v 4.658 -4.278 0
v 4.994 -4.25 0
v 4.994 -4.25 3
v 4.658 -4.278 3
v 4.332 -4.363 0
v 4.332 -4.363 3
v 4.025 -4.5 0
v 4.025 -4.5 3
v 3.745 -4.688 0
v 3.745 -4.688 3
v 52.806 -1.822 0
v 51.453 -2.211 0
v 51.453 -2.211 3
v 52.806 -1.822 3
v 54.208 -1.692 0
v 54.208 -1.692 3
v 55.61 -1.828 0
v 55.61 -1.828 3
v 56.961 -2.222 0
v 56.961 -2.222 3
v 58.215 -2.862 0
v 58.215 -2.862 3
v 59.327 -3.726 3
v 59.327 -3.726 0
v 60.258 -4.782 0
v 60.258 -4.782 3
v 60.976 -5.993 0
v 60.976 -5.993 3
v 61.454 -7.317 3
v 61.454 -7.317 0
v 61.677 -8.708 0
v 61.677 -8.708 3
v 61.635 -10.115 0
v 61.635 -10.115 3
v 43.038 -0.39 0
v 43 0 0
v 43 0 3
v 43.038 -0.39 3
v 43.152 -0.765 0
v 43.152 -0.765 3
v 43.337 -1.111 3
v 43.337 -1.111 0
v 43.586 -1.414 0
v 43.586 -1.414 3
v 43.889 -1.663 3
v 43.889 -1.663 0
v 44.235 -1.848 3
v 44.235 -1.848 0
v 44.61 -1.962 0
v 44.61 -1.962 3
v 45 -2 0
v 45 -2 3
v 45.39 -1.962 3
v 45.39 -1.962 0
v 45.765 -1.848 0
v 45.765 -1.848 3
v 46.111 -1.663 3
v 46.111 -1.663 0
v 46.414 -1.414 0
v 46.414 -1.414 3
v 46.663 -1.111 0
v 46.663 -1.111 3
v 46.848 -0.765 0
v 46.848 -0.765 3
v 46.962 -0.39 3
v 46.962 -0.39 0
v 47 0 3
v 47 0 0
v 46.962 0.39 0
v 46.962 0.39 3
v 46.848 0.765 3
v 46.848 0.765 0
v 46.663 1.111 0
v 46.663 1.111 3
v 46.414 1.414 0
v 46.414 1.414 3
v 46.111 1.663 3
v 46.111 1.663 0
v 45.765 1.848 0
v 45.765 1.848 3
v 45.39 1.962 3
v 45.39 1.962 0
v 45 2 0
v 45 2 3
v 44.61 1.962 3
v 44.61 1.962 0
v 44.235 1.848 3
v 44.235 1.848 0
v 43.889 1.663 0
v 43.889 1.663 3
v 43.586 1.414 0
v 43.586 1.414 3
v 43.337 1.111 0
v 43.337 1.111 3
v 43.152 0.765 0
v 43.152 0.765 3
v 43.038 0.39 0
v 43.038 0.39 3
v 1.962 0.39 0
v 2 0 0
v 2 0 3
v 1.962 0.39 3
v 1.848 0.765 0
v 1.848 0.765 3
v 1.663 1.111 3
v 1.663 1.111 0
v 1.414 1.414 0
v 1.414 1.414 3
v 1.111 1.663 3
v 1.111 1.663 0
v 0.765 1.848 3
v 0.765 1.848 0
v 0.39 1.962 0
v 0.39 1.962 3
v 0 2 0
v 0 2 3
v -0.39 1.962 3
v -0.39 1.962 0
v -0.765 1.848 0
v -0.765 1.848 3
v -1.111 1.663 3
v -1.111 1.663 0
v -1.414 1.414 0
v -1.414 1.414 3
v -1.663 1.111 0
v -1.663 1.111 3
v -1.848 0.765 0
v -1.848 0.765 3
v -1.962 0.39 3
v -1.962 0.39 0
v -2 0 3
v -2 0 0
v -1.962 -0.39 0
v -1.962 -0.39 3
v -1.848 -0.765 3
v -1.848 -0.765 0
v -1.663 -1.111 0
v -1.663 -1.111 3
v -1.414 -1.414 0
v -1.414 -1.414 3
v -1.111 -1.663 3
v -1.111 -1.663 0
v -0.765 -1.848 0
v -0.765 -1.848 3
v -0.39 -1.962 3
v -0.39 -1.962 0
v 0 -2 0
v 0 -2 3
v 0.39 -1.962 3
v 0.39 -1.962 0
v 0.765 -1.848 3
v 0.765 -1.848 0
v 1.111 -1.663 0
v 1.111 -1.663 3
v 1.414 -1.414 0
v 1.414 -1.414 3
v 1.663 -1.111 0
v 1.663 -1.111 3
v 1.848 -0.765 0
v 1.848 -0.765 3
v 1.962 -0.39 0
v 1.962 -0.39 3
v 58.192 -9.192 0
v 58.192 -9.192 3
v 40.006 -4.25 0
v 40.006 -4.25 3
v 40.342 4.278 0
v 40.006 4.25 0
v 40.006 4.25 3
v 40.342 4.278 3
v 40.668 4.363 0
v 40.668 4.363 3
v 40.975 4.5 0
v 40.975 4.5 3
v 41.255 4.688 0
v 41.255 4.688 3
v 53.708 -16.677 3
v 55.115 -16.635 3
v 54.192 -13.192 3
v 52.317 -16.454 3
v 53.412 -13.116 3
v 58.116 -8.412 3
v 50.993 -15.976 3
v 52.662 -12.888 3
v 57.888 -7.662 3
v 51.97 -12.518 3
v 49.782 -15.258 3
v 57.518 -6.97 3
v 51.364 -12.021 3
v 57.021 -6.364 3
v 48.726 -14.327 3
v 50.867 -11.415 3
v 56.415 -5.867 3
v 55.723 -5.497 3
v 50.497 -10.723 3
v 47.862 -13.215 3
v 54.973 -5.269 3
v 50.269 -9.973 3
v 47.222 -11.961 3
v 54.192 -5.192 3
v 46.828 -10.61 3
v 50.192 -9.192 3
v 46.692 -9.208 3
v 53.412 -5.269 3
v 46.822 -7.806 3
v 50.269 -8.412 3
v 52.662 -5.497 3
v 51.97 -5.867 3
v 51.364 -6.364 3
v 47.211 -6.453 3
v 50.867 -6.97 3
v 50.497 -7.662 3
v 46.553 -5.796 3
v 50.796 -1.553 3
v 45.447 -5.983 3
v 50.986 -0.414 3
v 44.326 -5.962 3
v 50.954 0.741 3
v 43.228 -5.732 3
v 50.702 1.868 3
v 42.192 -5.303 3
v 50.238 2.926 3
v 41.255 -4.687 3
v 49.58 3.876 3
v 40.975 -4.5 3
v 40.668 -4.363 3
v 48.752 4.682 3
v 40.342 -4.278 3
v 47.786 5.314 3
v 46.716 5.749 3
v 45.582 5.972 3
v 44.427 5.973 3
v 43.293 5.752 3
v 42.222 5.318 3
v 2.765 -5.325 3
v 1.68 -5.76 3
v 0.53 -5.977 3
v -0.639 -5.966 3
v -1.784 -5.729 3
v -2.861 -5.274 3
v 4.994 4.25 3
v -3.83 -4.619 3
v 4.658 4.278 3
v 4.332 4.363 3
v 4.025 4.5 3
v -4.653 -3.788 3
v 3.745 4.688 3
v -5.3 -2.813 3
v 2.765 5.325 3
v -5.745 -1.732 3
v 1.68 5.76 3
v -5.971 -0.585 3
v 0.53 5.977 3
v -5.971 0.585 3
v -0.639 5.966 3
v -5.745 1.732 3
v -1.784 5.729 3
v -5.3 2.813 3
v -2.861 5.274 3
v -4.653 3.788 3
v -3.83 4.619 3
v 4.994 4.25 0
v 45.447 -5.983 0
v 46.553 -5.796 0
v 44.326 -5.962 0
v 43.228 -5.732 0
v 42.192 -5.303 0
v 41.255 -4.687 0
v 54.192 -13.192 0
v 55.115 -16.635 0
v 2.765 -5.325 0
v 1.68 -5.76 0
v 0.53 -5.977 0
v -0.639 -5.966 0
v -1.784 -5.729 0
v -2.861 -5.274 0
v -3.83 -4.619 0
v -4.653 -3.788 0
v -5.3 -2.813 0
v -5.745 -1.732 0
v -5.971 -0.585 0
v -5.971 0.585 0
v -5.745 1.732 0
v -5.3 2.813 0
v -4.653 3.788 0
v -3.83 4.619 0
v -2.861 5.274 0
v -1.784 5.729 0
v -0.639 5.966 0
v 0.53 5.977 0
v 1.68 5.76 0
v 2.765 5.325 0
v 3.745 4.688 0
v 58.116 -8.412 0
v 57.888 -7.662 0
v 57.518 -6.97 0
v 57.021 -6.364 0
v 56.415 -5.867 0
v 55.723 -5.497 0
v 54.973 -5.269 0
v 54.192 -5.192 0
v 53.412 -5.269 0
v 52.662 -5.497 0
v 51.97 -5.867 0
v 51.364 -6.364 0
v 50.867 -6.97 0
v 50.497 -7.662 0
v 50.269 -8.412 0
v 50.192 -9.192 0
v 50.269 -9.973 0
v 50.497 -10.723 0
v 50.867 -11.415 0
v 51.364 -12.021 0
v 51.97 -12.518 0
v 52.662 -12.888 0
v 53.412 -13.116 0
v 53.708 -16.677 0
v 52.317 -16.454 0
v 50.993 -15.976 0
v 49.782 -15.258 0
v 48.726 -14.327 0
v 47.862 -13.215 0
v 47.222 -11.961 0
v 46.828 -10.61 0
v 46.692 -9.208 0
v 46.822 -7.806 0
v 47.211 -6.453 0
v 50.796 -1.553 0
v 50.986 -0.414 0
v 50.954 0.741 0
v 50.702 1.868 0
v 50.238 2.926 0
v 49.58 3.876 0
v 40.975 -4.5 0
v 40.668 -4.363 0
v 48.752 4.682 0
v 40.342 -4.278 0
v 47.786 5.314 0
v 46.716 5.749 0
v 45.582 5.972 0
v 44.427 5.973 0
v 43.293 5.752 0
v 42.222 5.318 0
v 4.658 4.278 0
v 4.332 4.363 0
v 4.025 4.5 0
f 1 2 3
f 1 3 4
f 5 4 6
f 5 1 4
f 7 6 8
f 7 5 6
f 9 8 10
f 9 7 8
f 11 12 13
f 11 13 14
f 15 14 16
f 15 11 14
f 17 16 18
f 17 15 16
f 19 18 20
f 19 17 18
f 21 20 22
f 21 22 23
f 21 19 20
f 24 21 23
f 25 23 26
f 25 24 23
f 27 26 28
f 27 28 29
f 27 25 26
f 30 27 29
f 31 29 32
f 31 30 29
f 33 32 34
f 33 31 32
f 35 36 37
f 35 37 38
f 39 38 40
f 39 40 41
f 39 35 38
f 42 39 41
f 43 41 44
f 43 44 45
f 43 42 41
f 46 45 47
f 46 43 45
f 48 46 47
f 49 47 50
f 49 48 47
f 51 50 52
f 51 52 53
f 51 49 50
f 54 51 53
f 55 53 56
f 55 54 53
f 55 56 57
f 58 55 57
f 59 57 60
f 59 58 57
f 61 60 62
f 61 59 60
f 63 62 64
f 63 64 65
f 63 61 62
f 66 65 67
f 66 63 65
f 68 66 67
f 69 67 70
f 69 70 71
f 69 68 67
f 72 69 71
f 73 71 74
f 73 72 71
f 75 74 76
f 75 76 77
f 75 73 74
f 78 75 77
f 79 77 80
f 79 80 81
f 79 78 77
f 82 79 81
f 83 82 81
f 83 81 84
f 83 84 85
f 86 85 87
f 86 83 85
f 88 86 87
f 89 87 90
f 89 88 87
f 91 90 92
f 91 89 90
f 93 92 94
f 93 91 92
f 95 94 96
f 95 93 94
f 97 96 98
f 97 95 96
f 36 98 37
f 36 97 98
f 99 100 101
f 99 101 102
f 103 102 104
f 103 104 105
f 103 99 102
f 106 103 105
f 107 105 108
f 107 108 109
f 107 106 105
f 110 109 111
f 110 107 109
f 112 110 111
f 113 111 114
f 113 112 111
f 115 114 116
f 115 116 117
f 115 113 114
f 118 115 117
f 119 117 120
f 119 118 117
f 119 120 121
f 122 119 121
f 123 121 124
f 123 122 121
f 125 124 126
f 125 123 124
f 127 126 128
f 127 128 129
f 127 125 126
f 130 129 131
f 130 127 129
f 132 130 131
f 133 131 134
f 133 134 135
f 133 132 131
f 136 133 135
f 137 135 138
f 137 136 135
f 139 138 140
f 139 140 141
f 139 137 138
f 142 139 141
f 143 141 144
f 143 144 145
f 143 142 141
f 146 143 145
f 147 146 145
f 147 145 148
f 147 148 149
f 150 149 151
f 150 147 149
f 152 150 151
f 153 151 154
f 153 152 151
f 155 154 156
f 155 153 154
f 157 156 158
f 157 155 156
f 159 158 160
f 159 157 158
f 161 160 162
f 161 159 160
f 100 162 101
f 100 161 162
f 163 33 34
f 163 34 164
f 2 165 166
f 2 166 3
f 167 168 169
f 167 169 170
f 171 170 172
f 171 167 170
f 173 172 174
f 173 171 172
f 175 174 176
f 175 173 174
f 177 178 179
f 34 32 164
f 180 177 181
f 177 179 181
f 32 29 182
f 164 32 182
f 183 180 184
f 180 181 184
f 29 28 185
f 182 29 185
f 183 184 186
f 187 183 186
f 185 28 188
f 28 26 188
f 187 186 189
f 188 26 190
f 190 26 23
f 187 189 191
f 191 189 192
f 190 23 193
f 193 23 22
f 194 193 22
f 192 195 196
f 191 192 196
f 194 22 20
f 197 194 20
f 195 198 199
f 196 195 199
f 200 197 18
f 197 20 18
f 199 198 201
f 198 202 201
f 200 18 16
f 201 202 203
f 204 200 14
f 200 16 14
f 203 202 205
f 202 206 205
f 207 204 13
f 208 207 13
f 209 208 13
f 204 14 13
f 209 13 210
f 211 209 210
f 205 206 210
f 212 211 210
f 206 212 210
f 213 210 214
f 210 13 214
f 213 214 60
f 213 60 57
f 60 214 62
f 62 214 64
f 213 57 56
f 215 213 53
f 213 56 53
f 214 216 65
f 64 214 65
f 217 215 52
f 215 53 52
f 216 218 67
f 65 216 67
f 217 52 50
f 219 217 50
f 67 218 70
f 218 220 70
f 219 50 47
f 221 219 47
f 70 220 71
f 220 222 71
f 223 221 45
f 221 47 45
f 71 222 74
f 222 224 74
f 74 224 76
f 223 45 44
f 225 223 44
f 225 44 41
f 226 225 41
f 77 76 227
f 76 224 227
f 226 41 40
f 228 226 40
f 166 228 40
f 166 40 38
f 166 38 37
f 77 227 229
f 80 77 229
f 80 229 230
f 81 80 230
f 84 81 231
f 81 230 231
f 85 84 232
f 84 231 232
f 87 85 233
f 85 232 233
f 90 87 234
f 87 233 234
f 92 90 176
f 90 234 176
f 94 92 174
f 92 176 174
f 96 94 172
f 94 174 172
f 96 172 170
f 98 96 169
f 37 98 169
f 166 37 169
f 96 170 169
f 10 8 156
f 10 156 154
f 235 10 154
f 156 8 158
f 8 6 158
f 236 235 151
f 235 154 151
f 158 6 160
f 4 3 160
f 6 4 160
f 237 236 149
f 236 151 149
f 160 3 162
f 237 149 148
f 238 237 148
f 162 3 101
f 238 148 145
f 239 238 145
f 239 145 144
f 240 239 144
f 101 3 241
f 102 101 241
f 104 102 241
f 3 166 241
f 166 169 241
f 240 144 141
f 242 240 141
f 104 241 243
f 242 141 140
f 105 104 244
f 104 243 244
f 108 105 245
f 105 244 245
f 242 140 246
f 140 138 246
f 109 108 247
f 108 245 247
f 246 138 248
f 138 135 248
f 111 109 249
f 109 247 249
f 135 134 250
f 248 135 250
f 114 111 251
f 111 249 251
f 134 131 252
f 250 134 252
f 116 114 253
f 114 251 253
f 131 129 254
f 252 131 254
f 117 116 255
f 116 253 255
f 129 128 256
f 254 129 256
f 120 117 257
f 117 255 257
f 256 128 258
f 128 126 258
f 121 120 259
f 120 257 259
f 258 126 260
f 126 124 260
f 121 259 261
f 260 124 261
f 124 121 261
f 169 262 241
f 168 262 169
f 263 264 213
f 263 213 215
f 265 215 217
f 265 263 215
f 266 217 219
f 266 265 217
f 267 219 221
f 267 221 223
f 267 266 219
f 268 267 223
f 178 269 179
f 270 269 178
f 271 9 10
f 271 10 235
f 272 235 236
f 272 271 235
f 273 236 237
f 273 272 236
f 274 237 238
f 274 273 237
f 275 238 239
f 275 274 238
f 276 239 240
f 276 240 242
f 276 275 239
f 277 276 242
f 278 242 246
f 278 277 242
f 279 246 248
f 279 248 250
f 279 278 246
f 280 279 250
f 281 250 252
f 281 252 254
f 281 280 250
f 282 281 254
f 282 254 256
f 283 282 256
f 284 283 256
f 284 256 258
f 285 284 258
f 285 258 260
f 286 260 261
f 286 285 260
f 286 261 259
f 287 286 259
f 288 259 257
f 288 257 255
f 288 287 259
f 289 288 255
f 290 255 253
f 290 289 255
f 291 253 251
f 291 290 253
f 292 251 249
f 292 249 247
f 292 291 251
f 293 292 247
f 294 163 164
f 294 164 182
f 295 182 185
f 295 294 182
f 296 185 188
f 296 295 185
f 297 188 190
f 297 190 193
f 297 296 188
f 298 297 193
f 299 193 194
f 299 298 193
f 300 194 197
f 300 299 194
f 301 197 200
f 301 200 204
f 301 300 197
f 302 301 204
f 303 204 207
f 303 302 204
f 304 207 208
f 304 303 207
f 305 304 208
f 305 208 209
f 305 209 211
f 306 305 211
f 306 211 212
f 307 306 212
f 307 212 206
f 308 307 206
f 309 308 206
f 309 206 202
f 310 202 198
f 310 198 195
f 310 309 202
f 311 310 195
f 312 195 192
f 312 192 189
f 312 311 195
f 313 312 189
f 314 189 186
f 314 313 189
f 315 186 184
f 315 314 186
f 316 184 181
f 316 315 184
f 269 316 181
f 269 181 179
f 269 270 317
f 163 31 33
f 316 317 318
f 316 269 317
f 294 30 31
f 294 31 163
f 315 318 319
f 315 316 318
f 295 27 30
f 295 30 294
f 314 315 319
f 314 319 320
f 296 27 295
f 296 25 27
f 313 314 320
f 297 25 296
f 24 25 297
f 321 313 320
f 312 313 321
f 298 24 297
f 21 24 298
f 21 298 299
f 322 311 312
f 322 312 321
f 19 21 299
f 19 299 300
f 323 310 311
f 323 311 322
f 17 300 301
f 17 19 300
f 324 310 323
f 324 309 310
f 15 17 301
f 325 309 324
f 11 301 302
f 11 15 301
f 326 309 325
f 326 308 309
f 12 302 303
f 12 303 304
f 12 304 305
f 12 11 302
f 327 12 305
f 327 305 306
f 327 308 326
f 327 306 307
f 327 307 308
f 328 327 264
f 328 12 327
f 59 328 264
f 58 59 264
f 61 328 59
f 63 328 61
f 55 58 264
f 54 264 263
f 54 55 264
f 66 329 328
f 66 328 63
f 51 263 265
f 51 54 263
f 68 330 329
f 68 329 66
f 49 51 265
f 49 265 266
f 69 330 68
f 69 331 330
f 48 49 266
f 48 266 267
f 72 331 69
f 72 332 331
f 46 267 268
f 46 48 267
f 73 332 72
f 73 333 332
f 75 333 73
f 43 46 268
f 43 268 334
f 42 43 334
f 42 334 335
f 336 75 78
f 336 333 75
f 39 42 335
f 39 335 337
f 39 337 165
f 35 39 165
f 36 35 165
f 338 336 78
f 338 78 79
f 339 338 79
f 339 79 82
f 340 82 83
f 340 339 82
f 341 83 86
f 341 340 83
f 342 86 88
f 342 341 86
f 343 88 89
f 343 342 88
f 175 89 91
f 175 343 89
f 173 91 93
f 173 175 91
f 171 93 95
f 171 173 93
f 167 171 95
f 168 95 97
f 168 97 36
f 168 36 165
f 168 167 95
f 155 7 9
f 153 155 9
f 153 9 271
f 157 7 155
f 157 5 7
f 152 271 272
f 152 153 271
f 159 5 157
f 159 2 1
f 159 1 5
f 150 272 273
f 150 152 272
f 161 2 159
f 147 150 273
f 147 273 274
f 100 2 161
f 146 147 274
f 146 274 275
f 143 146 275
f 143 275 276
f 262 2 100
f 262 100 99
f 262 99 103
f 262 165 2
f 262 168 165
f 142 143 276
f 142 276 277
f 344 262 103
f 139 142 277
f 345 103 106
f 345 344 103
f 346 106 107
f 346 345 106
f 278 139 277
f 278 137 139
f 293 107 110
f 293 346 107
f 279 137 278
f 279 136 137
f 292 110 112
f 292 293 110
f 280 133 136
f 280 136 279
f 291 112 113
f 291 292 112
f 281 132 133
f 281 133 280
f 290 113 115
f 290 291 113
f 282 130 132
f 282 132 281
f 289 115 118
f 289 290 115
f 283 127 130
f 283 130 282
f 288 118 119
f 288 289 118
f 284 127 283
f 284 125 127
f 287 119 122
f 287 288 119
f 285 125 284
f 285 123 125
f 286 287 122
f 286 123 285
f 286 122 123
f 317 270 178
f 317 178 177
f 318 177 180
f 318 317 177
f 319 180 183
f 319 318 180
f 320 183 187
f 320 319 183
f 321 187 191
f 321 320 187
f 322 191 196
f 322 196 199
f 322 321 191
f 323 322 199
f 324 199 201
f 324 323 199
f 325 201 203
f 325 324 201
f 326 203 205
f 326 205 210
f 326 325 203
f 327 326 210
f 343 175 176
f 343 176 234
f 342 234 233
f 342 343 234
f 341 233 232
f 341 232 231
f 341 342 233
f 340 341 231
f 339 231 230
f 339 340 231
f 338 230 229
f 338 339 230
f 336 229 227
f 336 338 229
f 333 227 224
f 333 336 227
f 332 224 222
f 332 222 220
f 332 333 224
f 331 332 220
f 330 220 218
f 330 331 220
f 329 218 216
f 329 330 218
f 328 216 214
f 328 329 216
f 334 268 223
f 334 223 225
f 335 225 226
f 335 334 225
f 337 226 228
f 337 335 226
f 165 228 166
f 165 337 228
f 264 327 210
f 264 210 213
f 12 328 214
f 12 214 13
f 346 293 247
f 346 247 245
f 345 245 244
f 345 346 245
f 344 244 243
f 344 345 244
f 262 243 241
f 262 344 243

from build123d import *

# Parameters (mm, degrees)
SKETCH_1_R      = 2
EXTRUDE_1_DEPTH = 3


with BuildPart() as part:
    # 草图1 → 凸台-拉伸1 (new body)
    with BuildSketch(Plane.XY):
        with BuildLine():
            Line((4.993746089, 4.25), (40.006253911, 4.25))
            ThreePointArc((40.006253911, 4.25), (40.667691739, 4.362541391), (41.254690433, 4.6875))
            ThreePointArc((41.254690433, 4.6875), (48.284291264, 5.02129773), (50.795554958, -1.552914271))
            Line((50.795554958, -1.552914271), (51.01040764, -1.767766953))
            Line((51.01040764, -1.767766953), (51.453152975, -2.210512288))
            ThreePointArc((51.453152975, -2.210512288), (58.791461904, -3.267987709), (61.635430691, -10.114948622))
            Line((61.635430691, -10.114948622), (58.192388155, -9.192388155))
            ThreePointArc((58.192388155, -9.192388155), (51.363961031, -6.363961031), (54.192388155, -13.192388155))
            Line((54.192388155, -13.192388155), (55.114948622, -16.635430691))
            ThreePointArc((55.114948622, -16.635430691), (48.267987709, -13.791461904), (47.210512288, -6.453152975))
            Line((47.210512288, -6.453152975), (46.767766953, -6.01040764))
            Line((46.767766953, -6.01040764), (46.552914271, -5.795554958))
            ThreePointArc((46.552914271, -5.795554958), (43.771750949, -5.872938299), (41.254690433, -4.6875))
            ThreePointArc((41.254690433, -4.6875), (40.667691739, -4.362541391), (40.006253911, -4.25))
            Line((40.006253911, -4.25), (4.993746089, -4.25))
            ThreePointArc((4.993746089, -4.25), (4.332308261, -4.362541391), (3.745309567, -4.6875))
            ThreePointArc((3.745309567, -4.6875), (-6, 0), (3.745309567, 4.6875))
            ThreePointArc((3.745309567, 4.6875), (4.332308261, 4.362541391), (4.993746089, 4.25))
        make_face()
        Circle(SKETCH_1_R, mode=Mode.SUBTRACT)
        with Locations(Location((45, 0, 0), (0, 0, 180))):
            Circle(SKETCH_1_R, mode=Mode.SUBTRACT)
    extrude(amount=EXTRUDE_1_DEPTH)


solid = part.part
